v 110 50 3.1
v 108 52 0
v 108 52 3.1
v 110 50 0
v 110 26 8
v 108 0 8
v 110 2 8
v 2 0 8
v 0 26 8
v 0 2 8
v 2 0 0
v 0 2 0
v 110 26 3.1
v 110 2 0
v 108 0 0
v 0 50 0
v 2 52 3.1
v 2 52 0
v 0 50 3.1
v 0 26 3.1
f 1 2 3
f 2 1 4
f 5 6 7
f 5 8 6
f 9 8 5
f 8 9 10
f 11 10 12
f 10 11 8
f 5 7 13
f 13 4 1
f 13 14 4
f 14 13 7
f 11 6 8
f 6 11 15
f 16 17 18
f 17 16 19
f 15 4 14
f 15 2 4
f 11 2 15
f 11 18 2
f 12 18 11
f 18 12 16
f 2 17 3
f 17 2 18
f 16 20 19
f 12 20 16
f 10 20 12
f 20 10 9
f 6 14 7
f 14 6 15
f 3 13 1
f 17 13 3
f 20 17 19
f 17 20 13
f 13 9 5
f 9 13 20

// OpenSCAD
$fn = 32;

// ----------------------------------------------------------------------
// Stepped bar: sidestep, 110 x 52 x 8/3.1 mm
// ----------------------------------------------------------------------

// --- parameters (mm) ---
bar_l = 110;              // bar length, X
bar_w = 52;               // bar width, Y
plate_t = 8;              // thickness of the thick zone, Z
thin_t = 3.1;             // thickness of the thin zone
corner_c = 2;             // corner chamfer of the bar
step_cut = 4.9;           // material removed from the thin zone
ledge_y = 26;             // start of the ledge from the front edge
depth_1 = 4.9;            // depth of cut 1 from the top face

profile = [[2, 0], [108, 0], [110, 2], [110, 50], [108, 52], [2, 52], [0, 50], [0, 2]];  // primary outline, 8 points, counter clockwise
void_1 = [[-1, 26], [111, 26], [111, 53], [-1, 53]];  // ledge cut along one edge, 4 points

// --- the one profile operation ---
difference() {
  linear_extrude(height = plate_t) polygon(points = profile);
  translate([0, 0, plate_t - depth_1])
    linear_extrude(height = depth_1 + 1) polygon(points = void_1);
}
